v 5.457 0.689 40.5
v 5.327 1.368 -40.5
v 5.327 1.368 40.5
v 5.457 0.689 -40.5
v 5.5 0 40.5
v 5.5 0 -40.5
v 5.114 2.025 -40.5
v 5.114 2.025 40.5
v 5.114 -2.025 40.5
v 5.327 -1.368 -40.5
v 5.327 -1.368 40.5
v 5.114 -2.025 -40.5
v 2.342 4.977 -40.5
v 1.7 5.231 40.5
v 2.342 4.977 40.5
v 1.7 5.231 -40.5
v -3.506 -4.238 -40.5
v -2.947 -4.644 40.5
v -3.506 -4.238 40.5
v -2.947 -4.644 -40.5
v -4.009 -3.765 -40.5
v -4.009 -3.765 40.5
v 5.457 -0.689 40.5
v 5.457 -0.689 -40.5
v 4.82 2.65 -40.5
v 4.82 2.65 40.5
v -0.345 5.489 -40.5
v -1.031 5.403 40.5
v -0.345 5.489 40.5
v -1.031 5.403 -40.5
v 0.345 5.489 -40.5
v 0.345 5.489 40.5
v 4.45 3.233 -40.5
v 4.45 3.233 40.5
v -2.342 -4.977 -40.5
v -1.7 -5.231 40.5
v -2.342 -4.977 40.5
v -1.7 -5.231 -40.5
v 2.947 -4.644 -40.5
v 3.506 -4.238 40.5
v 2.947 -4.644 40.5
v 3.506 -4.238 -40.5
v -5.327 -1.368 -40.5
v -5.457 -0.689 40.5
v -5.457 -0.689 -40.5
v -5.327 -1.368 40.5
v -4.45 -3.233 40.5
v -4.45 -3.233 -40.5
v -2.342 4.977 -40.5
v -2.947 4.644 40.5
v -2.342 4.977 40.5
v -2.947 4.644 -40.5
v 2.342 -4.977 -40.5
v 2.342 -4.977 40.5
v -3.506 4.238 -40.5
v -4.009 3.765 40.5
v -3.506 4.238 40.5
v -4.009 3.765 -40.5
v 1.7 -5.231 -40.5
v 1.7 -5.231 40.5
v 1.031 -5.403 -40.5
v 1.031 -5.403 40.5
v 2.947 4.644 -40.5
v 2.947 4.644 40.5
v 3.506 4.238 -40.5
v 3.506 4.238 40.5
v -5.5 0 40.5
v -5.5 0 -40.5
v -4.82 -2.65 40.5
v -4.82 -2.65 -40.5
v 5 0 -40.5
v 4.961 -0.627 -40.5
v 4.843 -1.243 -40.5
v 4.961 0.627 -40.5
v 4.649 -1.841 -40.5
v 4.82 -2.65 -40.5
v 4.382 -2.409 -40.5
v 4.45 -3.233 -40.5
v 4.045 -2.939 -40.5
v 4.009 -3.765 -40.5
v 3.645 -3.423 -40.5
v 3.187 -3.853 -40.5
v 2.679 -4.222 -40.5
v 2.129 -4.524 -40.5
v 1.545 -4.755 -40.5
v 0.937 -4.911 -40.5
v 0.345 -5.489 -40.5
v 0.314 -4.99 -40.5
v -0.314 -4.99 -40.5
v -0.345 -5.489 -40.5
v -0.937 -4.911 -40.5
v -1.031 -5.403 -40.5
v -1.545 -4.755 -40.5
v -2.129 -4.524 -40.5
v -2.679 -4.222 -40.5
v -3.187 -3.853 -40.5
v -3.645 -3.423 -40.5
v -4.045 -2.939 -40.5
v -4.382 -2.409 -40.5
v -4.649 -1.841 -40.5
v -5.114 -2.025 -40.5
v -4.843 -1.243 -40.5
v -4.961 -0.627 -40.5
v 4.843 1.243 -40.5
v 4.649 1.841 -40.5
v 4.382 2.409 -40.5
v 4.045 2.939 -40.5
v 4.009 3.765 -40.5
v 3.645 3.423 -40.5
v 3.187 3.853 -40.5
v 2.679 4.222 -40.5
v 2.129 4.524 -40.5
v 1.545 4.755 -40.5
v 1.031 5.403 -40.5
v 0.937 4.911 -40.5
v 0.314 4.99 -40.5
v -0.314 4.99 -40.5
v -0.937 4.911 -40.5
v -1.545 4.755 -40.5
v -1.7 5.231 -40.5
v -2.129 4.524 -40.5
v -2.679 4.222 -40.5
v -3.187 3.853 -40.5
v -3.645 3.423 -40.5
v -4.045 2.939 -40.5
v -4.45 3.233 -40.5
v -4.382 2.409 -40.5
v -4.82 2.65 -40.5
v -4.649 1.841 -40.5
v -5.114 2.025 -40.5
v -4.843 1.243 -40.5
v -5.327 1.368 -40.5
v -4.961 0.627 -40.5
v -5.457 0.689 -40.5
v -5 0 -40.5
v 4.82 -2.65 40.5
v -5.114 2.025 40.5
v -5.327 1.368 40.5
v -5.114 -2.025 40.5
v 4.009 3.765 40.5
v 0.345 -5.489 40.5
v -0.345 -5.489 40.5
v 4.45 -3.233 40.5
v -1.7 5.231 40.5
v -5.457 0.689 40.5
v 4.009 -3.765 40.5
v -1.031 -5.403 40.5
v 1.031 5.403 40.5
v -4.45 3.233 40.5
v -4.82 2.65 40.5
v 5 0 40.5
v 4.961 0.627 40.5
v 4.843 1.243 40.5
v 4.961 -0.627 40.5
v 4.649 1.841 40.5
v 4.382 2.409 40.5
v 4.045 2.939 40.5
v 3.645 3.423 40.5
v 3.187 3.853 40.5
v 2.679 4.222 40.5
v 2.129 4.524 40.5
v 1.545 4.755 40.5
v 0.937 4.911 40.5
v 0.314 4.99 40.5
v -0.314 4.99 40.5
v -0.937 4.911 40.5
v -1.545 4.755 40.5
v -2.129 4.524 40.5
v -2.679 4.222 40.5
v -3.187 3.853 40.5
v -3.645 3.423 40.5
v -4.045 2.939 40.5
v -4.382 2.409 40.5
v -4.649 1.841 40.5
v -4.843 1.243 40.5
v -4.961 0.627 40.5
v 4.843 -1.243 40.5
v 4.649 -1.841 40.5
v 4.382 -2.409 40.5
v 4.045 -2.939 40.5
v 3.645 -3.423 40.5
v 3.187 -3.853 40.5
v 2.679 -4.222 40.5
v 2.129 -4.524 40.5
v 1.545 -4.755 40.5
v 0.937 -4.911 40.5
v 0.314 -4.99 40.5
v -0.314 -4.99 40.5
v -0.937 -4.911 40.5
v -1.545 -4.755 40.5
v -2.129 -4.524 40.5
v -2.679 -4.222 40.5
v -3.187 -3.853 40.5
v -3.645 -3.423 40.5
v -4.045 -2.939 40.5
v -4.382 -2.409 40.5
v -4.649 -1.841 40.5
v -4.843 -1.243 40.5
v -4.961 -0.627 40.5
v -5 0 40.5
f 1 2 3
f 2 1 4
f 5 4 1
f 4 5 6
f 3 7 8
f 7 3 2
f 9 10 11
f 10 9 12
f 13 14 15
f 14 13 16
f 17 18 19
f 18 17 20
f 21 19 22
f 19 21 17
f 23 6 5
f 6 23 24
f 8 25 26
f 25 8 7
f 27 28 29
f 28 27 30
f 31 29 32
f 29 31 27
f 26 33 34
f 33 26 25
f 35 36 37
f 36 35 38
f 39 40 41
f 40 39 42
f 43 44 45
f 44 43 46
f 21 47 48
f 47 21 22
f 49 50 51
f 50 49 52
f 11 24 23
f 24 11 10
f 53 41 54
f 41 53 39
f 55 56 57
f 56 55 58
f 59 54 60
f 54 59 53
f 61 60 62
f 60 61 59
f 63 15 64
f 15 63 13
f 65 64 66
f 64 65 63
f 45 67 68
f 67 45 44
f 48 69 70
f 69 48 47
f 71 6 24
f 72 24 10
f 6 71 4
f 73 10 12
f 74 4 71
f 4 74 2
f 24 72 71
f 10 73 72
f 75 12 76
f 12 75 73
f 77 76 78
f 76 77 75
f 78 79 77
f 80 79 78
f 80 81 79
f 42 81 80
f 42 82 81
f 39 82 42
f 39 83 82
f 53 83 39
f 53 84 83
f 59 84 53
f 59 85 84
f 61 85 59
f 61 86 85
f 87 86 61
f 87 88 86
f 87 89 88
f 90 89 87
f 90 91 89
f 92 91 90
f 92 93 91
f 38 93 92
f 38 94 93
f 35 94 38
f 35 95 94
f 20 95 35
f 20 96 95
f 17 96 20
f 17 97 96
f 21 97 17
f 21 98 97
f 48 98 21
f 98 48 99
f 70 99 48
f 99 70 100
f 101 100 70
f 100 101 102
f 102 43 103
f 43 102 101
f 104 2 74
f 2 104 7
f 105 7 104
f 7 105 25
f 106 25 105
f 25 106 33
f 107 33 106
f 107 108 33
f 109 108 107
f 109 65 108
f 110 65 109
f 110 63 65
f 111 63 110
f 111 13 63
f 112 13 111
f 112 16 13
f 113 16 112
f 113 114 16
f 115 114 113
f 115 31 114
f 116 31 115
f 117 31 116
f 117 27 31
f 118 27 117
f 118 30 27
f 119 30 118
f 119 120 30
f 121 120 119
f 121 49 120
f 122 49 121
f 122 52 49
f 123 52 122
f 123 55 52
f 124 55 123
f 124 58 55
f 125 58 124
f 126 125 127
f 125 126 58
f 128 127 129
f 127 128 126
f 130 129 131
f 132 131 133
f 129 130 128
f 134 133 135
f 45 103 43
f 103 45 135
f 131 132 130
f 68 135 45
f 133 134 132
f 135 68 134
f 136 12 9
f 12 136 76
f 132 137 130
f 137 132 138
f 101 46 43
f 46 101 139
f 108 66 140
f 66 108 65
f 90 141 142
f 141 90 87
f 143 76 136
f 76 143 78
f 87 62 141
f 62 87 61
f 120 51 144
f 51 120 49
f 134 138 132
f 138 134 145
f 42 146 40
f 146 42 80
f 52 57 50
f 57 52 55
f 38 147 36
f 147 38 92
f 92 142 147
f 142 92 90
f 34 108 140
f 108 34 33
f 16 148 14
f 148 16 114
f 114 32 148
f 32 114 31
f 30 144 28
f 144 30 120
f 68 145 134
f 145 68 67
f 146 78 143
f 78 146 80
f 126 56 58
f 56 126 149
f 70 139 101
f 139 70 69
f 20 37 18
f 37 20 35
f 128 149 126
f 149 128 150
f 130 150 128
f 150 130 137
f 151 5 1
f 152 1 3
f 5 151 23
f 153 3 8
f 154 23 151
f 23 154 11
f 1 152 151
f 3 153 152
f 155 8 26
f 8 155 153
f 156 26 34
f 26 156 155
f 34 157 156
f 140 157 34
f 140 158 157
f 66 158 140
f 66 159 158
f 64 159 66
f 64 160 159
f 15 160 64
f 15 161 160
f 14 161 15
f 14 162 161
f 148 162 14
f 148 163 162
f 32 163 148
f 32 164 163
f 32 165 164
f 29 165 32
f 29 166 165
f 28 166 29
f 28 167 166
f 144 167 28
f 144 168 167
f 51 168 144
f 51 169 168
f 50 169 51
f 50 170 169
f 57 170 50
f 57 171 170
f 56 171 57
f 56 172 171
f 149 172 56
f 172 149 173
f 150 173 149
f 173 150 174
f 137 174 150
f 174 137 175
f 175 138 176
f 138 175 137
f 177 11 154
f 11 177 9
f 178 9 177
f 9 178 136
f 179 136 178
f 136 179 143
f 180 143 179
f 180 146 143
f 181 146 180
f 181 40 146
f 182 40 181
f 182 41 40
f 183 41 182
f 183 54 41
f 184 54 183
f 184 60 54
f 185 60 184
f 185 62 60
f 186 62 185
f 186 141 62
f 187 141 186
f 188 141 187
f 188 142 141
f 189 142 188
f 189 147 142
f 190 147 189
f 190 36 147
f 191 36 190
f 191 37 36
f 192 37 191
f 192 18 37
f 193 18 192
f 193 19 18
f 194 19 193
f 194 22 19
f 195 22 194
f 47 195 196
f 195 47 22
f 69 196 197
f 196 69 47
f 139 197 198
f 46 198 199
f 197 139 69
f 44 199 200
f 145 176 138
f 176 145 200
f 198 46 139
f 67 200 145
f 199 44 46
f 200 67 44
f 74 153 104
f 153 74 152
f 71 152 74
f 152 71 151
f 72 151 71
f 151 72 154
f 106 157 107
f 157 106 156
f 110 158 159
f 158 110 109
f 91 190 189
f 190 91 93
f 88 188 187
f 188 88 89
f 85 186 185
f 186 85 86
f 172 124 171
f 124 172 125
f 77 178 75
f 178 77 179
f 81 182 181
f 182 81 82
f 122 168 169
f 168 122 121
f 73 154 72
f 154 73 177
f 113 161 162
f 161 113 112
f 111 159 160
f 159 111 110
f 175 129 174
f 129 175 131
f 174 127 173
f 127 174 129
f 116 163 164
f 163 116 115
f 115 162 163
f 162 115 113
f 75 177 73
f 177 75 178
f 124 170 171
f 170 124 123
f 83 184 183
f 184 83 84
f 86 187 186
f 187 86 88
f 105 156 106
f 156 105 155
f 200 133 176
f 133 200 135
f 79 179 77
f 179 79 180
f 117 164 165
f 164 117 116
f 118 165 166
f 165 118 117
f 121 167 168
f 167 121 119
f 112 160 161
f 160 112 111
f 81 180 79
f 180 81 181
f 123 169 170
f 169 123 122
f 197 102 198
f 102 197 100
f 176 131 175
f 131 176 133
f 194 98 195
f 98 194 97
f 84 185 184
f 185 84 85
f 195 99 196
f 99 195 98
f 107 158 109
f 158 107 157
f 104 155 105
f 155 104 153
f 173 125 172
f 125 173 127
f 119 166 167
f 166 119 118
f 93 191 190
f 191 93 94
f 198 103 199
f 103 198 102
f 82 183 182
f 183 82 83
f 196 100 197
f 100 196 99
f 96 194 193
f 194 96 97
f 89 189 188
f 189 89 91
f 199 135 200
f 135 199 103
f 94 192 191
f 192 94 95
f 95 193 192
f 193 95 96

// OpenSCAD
$fn = 50;


difference() {
	union() {
		translate(v = [0, 0, -40.5000000000]) {
			cylinder(h = 81, r = 5.5000000000);
		}
	}
	union() {
		translate(v = [0, 0, -100.0000000000]) {
			cylinder(h = 200, r = 5.0000000000);
		}
	}
}
